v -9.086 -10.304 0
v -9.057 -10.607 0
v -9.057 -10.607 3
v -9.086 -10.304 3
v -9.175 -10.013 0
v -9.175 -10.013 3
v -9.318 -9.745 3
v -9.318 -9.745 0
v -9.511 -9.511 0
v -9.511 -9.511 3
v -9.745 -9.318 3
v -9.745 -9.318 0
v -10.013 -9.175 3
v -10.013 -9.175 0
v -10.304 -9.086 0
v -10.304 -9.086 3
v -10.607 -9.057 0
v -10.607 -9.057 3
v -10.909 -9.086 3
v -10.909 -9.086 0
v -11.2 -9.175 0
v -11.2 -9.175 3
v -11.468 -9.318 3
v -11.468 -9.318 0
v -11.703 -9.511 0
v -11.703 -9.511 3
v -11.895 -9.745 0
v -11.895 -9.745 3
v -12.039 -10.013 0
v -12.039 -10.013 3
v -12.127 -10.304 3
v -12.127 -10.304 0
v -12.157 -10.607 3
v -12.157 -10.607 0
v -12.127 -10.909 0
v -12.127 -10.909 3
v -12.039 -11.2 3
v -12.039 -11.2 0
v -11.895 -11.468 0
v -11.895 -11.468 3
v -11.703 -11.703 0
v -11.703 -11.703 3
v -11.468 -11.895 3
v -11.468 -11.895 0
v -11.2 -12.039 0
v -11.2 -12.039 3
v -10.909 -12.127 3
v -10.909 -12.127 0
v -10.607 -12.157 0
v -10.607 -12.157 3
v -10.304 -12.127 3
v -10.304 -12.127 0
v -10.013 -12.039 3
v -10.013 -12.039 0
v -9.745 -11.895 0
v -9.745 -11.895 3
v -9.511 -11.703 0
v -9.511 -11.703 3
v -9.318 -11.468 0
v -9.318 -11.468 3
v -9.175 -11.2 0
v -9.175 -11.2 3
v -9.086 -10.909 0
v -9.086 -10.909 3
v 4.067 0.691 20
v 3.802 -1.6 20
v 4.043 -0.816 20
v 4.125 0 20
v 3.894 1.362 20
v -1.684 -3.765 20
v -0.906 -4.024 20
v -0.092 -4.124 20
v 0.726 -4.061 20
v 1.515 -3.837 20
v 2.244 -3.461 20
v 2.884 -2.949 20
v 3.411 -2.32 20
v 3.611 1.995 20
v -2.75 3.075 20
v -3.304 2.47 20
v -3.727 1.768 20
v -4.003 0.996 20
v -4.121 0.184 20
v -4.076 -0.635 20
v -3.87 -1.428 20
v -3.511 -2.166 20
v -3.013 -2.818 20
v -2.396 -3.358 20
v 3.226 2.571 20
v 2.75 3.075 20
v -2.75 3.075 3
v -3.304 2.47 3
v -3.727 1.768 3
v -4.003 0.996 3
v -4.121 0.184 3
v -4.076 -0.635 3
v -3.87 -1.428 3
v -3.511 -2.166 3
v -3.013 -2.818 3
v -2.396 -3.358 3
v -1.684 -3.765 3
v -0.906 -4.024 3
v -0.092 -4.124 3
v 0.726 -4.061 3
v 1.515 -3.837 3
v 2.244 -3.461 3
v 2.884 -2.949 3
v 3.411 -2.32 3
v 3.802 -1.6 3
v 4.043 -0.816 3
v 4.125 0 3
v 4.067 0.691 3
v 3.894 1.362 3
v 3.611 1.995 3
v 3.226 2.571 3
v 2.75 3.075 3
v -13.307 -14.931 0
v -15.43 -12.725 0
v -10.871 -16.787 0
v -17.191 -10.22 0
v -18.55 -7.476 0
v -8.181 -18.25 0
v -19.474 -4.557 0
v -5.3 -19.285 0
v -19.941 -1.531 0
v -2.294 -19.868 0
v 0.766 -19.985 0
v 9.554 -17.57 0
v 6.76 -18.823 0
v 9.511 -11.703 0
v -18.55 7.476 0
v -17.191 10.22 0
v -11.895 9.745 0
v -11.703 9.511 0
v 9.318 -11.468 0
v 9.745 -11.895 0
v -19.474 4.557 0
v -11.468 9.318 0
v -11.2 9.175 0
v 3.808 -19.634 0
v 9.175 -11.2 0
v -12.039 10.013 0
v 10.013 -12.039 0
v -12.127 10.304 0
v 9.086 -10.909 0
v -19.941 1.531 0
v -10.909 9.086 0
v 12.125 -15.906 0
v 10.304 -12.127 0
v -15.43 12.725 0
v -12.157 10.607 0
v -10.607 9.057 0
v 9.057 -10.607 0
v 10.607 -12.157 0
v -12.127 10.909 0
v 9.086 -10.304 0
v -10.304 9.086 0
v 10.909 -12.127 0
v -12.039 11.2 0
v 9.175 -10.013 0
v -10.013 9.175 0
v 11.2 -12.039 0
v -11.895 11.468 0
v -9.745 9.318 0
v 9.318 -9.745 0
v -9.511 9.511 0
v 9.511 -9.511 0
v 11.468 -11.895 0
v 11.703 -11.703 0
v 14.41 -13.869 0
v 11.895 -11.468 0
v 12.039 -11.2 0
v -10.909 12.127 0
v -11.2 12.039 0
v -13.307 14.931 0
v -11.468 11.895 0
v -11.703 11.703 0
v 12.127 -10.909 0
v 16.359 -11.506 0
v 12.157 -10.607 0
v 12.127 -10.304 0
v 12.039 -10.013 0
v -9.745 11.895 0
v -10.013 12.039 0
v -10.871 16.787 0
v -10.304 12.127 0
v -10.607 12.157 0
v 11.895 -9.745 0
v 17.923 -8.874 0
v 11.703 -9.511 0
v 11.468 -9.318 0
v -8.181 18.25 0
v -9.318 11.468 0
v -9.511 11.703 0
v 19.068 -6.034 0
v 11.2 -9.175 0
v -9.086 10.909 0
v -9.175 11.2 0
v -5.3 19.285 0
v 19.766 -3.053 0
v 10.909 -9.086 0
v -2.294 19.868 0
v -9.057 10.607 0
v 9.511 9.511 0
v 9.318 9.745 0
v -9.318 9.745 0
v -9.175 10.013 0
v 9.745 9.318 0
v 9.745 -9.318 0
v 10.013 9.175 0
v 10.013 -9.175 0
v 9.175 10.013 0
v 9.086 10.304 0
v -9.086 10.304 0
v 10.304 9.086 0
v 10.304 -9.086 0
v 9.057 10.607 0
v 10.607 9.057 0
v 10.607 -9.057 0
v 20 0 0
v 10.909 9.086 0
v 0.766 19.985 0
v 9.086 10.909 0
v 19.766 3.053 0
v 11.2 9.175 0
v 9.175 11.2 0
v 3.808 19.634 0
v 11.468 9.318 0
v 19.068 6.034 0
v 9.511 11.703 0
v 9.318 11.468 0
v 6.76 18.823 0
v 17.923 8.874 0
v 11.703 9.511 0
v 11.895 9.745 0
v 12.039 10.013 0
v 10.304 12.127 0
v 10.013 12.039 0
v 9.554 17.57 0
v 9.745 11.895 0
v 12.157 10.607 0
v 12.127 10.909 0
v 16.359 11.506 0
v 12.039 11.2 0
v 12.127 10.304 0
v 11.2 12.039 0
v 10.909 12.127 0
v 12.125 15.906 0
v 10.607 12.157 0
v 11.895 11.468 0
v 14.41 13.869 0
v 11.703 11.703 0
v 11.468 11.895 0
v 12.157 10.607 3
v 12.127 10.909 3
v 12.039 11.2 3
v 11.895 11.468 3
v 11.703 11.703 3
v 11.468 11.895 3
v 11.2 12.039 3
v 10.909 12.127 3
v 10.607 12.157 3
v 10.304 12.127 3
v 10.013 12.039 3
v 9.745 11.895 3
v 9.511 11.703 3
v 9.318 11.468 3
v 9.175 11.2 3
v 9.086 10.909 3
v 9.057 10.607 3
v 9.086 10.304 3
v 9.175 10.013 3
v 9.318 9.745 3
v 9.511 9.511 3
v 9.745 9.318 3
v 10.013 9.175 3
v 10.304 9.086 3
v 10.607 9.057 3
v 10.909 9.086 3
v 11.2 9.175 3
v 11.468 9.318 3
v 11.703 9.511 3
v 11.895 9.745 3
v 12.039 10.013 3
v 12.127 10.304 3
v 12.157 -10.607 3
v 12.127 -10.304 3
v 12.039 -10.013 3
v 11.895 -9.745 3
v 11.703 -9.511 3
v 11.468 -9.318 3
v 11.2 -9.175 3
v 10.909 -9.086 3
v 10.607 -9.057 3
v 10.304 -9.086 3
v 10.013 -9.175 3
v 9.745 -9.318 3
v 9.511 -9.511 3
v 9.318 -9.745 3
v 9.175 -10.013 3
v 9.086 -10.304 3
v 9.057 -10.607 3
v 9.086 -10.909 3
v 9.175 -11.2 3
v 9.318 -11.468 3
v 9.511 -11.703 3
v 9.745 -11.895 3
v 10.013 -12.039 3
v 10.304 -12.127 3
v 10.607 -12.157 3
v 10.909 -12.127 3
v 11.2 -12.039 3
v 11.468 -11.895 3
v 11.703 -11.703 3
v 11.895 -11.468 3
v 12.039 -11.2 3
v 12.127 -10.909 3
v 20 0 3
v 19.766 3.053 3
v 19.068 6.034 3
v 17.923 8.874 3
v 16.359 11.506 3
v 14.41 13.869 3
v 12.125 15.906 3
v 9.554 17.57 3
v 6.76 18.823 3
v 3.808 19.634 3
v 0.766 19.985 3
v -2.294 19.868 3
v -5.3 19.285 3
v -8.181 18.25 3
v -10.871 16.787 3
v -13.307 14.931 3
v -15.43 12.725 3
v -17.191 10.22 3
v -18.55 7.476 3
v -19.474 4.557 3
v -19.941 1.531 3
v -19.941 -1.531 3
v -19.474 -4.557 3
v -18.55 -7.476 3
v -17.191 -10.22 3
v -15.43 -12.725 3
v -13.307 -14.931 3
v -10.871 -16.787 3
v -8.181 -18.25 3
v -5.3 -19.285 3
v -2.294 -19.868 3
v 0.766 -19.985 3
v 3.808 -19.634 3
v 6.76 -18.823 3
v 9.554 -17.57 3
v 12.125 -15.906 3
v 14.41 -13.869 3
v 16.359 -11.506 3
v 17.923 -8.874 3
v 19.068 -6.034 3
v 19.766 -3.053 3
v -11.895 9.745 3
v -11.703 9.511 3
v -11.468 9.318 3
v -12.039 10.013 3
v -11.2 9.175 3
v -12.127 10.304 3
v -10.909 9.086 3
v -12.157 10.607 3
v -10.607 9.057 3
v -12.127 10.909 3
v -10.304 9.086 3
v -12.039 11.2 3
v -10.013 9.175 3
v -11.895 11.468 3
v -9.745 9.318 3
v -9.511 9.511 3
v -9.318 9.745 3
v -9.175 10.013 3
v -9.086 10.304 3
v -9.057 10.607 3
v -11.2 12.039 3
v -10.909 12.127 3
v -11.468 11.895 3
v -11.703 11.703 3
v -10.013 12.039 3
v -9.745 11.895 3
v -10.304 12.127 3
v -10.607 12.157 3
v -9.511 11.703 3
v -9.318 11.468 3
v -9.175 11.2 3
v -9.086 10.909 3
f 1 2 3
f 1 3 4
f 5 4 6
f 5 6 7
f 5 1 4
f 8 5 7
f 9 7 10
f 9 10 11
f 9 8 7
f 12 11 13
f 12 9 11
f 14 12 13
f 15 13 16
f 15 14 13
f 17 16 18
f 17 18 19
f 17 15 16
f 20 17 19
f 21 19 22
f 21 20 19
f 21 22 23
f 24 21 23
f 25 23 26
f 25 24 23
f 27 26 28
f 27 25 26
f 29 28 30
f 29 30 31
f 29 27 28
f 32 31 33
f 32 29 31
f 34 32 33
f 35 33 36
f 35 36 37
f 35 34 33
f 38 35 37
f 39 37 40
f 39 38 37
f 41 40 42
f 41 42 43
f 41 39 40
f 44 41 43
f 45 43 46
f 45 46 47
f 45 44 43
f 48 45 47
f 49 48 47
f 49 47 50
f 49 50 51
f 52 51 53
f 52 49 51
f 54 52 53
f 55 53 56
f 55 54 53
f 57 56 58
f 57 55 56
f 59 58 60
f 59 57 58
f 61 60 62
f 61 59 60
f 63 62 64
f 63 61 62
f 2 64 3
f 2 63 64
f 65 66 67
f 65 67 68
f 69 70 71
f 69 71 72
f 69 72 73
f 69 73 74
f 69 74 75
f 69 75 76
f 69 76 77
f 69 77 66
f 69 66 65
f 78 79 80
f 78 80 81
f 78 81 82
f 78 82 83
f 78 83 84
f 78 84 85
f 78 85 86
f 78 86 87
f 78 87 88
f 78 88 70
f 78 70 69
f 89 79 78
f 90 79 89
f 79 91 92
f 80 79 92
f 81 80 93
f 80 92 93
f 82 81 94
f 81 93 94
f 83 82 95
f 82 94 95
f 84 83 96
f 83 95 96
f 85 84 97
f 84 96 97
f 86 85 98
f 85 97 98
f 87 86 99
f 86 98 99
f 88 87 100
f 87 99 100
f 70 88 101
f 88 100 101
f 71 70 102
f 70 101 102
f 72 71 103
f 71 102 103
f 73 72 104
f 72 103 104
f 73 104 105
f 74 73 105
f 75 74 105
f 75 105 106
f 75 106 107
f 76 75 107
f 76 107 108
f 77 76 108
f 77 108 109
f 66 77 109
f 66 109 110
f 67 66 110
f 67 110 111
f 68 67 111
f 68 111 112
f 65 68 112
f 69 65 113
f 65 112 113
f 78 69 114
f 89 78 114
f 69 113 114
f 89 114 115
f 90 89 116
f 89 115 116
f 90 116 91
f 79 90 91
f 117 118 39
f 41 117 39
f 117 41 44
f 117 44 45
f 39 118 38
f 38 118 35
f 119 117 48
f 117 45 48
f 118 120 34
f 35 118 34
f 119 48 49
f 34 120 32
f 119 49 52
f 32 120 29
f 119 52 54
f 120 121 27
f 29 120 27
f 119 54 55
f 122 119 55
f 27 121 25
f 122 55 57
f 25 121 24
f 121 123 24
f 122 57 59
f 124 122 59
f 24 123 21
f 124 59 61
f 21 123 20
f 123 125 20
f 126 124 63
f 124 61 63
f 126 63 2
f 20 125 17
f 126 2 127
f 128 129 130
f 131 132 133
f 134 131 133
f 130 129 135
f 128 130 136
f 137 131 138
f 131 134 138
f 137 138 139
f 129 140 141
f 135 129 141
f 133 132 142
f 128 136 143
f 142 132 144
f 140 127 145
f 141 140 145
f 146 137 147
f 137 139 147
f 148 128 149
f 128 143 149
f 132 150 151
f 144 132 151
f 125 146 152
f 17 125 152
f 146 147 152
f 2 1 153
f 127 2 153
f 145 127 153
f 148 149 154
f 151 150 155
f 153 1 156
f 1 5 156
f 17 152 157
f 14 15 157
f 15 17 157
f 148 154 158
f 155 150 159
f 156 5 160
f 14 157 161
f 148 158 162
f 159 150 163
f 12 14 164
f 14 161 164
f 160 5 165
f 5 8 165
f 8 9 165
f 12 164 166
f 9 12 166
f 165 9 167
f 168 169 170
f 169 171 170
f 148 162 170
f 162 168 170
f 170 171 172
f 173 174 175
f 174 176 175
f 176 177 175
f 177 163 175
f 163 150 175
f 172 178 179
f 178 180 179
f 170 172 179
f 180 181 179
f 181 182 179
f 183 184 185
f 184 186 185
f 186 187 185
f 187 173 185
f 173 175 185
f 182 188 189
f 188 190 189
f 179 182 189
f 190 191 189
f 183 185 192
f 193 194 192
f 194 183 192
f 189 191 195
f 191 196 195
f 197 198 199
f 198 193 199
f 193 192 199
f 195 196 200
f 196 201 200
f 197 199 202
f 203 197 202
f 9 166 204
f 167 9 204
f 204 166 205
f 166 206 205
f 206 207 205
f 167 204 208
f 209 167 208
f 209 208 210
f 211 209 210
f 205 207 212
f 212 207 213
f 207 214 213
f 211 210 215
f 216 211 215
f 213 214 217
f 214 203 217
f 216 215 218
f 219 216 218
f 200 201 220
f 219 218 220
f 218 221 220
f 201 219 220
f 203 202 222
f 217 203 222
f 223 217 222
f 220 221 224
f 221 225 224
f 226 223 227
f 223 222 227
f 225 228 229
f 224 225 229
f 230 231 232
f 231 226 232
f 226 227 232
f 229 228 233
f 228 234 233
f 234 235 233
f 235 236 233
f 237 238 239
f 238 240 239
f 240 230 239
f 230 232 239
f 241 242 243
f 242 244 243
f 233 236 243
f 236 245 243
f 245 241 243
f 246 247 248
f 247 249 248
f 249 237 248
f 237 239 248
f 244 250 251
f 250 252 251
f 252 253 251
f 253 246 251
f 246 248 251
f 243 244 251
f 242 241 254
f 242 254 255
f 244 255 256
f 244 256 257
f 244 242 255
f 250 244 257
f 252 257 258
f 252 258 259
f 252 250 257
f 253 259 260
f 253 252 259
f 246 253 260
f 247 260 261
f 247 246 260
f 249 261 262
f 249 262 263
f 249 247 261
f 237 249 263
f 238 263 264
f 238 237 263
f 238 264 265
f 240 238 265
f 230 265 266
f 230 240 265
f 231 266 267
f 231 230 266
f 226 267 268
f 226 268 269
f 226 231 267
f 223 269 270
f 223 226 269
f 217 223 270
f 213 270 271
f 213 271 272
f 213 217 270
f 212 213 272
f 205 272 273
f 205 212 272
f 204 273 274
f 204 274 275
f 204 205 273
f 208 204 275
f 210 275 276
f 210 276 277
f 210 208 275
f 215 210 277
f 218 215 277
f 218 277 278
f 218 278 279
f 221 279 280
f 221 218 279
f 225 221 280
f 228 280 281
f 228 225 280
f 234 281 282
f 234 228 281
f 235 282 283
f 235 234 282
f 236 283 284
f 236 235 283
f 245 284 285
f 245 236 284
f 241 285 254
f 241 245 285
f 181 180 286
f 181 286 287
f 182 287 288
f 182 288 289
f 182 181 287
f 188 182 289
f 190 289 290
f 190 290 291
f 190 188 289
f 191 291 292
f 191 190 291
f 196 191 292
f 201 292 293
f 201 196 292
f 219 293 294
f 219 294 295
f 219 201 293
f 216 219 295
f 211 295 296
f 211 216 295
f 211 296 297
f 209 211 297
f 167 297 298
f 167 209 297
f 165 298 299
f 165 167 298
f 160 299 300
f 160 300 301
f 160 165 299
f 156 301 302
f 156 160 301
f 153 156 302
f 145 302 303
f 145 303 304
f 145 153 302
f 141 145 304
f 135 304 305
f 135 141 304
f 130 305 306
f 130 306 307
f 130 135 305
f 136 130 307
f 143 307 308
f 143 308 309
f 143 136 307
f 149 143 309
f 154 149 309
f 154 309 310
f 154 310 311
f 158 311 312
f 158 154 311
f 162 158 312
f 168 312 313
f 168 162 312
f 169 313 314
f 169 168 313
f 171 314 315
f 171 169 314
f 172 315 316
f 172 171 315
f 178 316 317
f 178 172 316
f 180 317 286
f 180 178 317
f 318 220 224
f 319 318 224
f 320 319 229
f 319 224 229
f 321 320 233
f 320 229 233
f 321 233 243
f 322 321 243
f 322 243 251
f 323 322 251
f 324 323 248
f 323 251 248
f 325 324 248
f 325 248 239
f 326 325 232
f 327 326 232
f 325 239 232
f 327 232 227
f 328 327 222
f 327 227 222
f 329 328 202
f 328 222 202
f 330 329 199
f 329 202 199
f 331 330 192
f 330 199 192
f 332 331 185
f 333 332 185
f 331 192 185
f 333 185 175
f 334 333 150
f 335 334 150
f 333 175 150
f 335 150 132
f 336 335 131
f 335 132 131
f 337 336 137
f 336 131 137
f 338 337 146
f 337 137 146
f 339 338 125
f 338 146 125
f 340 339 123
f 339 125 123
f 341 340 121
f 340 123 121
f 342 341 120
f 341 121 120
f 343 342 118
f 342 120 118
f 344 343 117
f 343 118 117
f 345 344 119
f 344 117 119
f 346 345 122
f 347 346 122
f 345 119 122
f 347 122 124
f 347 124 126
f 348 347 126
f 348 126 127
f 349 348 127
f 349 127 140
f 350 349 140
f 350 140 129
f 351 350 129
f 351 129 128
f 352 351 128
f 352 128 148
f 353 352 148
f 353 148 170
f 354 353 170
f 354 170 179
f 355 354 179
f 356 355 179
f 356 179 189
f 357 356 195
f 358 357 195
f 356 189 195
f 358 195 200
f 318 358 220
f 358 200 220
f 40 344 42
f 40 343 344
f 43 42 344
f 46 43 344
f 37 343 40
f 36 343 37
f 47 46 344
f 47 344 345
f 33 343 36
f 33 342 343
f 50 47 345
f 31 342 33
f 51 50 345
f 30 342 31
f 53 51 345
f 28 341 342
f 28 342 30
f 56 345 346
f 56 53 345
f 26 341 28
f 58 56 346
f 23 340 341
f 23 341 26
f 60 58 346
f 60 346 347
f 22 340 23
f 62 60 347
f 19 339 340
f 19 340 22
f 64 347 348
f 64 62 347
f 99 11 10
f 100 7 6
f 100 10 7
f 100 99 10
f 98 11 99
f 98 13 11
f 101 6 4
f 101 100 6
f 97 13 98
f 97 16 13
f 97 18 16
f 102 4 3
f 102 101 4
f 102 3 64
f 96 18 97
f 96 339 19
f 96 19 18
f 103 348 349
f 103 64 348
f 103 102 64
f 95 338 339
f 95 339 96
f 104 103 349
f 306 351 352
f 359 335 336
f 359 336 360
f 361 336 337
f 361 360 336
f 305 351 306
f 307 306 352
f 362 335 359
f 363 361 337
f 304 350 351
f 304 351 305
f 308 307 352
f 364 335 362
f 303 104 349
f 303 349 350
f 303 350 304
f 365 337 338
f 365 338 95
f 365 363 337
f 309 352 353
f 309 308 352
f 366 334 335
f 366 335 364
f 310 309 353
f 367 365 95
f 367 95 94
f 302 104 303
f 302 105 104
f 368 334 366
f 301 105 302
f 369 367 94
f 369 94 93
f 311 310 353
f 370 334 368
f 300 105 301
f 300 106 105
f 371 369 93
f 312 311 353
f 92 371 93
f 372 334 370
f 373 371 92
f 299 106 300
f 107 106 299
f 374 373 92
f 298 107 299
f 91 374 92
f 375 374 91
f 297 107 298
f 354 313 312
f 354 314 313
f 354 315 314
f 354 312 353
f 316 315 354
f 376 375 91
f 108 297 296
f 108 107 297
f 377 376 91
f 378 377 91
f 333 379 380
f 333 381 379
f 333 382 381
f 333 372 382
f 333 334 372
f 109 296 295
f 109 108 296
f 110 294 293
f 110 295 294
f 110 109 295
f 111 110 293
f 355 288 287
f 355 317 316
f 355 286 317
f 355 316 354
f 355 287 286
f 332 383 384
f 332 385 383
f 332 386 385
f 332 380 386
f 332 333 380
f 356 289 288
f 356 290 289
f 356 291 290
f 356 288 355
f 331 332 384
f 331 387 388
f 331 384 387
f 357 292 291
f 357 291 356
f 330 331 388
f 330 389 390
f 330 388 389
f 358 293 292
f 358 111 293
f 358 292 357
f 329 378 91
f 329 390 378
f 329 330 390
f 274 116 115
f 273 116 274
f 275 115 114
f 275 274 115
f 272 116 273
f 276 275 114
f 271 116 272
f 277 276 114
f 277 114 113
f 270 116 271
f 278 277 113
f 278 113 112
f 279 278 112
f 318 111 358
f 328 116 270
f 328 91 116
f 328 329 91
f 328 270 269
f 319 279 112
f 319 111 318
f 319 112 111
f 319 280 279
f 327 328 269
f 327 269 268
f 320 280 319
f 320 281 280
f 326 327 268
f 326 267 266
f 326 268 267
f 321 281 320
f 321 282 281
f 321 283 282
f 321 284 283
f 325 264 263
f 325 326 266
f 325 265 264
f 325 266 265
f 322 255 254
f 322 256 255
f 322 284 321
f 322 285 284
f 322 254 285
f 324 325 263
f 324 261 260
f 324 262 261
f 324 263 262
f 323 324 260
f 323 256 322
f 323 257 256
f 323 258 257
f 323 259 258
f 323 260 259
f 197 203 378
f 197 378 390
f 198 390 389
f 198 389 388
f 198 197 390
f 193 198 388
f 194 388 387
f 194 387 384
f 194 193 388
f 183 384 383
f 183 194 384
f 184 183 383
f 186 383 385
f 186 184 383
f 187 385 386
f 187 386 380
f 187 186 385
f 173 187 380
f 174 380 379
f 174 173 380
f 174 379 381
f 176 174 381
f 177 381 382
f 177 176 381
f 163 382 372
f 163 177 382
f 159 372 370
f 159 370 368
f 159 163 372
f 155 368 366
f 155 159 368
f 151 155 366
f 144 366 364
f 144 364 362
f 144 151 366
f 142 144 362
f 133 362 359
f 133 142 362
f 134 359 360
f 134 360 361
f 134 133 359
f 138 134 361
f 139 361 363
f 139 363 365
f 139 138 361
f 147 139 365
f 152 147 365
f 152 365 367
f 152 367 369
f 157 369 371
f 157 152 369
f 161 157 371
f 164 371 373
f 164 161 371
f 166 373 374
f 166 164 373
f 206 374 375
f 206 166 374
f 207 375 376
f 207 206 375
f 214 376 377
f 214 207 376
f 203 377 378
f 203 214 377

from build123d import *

# Parameters (mm, degrees)
SKETCH1_R           = 20
SKETCH1_R_2         = 1.55
BOSS_EXTRUDE1_DEPTH = 3
BOSS_EXTRUDE2_DEPTH = 20


with BuildPart() as part:
    # Sketch1 → Boss-Extrude1 (new body)
    with BuildSketch(Plane.XY):
        Circle(SKETCH1_R)
        with BuildLine():
            Line((-2.749545417, 3.075), (2.749545417, 3.075))
            ThreePointArc((2.749545417, 3.075), (0, -4.125), (-2.749545417, 3.075))
        make_face(mode=Mode.SUBTRACT)
        with Locations((-10.606601718, -10.606601718)):
            Circle(SKETCH1_R_2, mode=Mode.SUBTRACT)
        with Locations((10.606601718, -10.606601718)):
            Circle(SKETCH1_R_2, mode=Mode.SUBTRACT)
        with Locations((-10.606601718, 10.606601718)):
            Circle(SKETCH1_R_2, mode=Mode.SUBTRACT)
        with Locations((10.606601718, 10.606601718)):
            Circle(SKETCH1_R_2, mode=Mode.SUBTRACT)
    extrude(amount=BOSS_EXTRUDE1_DEPTH)

    # Sketch1<3> → Boss-Extrude2 (add)
    with BuildSketch(Plane.XY):
        with BuildLine():
            Line((2.749545417, 3.075), (-2.749545417, 3.075))
            ThreePointArc((-2.749545417, 3.075), (-1.684302549, -3.765468088), (4.125, 0))
            ThreePointArc((4.125, 0), (3.765468088, 1.684302549), (2.749545417, 3.075))
        make_face()
    extrude(amount=BOSS_EXTRUDE2_DEPTH)


solid = part.part
